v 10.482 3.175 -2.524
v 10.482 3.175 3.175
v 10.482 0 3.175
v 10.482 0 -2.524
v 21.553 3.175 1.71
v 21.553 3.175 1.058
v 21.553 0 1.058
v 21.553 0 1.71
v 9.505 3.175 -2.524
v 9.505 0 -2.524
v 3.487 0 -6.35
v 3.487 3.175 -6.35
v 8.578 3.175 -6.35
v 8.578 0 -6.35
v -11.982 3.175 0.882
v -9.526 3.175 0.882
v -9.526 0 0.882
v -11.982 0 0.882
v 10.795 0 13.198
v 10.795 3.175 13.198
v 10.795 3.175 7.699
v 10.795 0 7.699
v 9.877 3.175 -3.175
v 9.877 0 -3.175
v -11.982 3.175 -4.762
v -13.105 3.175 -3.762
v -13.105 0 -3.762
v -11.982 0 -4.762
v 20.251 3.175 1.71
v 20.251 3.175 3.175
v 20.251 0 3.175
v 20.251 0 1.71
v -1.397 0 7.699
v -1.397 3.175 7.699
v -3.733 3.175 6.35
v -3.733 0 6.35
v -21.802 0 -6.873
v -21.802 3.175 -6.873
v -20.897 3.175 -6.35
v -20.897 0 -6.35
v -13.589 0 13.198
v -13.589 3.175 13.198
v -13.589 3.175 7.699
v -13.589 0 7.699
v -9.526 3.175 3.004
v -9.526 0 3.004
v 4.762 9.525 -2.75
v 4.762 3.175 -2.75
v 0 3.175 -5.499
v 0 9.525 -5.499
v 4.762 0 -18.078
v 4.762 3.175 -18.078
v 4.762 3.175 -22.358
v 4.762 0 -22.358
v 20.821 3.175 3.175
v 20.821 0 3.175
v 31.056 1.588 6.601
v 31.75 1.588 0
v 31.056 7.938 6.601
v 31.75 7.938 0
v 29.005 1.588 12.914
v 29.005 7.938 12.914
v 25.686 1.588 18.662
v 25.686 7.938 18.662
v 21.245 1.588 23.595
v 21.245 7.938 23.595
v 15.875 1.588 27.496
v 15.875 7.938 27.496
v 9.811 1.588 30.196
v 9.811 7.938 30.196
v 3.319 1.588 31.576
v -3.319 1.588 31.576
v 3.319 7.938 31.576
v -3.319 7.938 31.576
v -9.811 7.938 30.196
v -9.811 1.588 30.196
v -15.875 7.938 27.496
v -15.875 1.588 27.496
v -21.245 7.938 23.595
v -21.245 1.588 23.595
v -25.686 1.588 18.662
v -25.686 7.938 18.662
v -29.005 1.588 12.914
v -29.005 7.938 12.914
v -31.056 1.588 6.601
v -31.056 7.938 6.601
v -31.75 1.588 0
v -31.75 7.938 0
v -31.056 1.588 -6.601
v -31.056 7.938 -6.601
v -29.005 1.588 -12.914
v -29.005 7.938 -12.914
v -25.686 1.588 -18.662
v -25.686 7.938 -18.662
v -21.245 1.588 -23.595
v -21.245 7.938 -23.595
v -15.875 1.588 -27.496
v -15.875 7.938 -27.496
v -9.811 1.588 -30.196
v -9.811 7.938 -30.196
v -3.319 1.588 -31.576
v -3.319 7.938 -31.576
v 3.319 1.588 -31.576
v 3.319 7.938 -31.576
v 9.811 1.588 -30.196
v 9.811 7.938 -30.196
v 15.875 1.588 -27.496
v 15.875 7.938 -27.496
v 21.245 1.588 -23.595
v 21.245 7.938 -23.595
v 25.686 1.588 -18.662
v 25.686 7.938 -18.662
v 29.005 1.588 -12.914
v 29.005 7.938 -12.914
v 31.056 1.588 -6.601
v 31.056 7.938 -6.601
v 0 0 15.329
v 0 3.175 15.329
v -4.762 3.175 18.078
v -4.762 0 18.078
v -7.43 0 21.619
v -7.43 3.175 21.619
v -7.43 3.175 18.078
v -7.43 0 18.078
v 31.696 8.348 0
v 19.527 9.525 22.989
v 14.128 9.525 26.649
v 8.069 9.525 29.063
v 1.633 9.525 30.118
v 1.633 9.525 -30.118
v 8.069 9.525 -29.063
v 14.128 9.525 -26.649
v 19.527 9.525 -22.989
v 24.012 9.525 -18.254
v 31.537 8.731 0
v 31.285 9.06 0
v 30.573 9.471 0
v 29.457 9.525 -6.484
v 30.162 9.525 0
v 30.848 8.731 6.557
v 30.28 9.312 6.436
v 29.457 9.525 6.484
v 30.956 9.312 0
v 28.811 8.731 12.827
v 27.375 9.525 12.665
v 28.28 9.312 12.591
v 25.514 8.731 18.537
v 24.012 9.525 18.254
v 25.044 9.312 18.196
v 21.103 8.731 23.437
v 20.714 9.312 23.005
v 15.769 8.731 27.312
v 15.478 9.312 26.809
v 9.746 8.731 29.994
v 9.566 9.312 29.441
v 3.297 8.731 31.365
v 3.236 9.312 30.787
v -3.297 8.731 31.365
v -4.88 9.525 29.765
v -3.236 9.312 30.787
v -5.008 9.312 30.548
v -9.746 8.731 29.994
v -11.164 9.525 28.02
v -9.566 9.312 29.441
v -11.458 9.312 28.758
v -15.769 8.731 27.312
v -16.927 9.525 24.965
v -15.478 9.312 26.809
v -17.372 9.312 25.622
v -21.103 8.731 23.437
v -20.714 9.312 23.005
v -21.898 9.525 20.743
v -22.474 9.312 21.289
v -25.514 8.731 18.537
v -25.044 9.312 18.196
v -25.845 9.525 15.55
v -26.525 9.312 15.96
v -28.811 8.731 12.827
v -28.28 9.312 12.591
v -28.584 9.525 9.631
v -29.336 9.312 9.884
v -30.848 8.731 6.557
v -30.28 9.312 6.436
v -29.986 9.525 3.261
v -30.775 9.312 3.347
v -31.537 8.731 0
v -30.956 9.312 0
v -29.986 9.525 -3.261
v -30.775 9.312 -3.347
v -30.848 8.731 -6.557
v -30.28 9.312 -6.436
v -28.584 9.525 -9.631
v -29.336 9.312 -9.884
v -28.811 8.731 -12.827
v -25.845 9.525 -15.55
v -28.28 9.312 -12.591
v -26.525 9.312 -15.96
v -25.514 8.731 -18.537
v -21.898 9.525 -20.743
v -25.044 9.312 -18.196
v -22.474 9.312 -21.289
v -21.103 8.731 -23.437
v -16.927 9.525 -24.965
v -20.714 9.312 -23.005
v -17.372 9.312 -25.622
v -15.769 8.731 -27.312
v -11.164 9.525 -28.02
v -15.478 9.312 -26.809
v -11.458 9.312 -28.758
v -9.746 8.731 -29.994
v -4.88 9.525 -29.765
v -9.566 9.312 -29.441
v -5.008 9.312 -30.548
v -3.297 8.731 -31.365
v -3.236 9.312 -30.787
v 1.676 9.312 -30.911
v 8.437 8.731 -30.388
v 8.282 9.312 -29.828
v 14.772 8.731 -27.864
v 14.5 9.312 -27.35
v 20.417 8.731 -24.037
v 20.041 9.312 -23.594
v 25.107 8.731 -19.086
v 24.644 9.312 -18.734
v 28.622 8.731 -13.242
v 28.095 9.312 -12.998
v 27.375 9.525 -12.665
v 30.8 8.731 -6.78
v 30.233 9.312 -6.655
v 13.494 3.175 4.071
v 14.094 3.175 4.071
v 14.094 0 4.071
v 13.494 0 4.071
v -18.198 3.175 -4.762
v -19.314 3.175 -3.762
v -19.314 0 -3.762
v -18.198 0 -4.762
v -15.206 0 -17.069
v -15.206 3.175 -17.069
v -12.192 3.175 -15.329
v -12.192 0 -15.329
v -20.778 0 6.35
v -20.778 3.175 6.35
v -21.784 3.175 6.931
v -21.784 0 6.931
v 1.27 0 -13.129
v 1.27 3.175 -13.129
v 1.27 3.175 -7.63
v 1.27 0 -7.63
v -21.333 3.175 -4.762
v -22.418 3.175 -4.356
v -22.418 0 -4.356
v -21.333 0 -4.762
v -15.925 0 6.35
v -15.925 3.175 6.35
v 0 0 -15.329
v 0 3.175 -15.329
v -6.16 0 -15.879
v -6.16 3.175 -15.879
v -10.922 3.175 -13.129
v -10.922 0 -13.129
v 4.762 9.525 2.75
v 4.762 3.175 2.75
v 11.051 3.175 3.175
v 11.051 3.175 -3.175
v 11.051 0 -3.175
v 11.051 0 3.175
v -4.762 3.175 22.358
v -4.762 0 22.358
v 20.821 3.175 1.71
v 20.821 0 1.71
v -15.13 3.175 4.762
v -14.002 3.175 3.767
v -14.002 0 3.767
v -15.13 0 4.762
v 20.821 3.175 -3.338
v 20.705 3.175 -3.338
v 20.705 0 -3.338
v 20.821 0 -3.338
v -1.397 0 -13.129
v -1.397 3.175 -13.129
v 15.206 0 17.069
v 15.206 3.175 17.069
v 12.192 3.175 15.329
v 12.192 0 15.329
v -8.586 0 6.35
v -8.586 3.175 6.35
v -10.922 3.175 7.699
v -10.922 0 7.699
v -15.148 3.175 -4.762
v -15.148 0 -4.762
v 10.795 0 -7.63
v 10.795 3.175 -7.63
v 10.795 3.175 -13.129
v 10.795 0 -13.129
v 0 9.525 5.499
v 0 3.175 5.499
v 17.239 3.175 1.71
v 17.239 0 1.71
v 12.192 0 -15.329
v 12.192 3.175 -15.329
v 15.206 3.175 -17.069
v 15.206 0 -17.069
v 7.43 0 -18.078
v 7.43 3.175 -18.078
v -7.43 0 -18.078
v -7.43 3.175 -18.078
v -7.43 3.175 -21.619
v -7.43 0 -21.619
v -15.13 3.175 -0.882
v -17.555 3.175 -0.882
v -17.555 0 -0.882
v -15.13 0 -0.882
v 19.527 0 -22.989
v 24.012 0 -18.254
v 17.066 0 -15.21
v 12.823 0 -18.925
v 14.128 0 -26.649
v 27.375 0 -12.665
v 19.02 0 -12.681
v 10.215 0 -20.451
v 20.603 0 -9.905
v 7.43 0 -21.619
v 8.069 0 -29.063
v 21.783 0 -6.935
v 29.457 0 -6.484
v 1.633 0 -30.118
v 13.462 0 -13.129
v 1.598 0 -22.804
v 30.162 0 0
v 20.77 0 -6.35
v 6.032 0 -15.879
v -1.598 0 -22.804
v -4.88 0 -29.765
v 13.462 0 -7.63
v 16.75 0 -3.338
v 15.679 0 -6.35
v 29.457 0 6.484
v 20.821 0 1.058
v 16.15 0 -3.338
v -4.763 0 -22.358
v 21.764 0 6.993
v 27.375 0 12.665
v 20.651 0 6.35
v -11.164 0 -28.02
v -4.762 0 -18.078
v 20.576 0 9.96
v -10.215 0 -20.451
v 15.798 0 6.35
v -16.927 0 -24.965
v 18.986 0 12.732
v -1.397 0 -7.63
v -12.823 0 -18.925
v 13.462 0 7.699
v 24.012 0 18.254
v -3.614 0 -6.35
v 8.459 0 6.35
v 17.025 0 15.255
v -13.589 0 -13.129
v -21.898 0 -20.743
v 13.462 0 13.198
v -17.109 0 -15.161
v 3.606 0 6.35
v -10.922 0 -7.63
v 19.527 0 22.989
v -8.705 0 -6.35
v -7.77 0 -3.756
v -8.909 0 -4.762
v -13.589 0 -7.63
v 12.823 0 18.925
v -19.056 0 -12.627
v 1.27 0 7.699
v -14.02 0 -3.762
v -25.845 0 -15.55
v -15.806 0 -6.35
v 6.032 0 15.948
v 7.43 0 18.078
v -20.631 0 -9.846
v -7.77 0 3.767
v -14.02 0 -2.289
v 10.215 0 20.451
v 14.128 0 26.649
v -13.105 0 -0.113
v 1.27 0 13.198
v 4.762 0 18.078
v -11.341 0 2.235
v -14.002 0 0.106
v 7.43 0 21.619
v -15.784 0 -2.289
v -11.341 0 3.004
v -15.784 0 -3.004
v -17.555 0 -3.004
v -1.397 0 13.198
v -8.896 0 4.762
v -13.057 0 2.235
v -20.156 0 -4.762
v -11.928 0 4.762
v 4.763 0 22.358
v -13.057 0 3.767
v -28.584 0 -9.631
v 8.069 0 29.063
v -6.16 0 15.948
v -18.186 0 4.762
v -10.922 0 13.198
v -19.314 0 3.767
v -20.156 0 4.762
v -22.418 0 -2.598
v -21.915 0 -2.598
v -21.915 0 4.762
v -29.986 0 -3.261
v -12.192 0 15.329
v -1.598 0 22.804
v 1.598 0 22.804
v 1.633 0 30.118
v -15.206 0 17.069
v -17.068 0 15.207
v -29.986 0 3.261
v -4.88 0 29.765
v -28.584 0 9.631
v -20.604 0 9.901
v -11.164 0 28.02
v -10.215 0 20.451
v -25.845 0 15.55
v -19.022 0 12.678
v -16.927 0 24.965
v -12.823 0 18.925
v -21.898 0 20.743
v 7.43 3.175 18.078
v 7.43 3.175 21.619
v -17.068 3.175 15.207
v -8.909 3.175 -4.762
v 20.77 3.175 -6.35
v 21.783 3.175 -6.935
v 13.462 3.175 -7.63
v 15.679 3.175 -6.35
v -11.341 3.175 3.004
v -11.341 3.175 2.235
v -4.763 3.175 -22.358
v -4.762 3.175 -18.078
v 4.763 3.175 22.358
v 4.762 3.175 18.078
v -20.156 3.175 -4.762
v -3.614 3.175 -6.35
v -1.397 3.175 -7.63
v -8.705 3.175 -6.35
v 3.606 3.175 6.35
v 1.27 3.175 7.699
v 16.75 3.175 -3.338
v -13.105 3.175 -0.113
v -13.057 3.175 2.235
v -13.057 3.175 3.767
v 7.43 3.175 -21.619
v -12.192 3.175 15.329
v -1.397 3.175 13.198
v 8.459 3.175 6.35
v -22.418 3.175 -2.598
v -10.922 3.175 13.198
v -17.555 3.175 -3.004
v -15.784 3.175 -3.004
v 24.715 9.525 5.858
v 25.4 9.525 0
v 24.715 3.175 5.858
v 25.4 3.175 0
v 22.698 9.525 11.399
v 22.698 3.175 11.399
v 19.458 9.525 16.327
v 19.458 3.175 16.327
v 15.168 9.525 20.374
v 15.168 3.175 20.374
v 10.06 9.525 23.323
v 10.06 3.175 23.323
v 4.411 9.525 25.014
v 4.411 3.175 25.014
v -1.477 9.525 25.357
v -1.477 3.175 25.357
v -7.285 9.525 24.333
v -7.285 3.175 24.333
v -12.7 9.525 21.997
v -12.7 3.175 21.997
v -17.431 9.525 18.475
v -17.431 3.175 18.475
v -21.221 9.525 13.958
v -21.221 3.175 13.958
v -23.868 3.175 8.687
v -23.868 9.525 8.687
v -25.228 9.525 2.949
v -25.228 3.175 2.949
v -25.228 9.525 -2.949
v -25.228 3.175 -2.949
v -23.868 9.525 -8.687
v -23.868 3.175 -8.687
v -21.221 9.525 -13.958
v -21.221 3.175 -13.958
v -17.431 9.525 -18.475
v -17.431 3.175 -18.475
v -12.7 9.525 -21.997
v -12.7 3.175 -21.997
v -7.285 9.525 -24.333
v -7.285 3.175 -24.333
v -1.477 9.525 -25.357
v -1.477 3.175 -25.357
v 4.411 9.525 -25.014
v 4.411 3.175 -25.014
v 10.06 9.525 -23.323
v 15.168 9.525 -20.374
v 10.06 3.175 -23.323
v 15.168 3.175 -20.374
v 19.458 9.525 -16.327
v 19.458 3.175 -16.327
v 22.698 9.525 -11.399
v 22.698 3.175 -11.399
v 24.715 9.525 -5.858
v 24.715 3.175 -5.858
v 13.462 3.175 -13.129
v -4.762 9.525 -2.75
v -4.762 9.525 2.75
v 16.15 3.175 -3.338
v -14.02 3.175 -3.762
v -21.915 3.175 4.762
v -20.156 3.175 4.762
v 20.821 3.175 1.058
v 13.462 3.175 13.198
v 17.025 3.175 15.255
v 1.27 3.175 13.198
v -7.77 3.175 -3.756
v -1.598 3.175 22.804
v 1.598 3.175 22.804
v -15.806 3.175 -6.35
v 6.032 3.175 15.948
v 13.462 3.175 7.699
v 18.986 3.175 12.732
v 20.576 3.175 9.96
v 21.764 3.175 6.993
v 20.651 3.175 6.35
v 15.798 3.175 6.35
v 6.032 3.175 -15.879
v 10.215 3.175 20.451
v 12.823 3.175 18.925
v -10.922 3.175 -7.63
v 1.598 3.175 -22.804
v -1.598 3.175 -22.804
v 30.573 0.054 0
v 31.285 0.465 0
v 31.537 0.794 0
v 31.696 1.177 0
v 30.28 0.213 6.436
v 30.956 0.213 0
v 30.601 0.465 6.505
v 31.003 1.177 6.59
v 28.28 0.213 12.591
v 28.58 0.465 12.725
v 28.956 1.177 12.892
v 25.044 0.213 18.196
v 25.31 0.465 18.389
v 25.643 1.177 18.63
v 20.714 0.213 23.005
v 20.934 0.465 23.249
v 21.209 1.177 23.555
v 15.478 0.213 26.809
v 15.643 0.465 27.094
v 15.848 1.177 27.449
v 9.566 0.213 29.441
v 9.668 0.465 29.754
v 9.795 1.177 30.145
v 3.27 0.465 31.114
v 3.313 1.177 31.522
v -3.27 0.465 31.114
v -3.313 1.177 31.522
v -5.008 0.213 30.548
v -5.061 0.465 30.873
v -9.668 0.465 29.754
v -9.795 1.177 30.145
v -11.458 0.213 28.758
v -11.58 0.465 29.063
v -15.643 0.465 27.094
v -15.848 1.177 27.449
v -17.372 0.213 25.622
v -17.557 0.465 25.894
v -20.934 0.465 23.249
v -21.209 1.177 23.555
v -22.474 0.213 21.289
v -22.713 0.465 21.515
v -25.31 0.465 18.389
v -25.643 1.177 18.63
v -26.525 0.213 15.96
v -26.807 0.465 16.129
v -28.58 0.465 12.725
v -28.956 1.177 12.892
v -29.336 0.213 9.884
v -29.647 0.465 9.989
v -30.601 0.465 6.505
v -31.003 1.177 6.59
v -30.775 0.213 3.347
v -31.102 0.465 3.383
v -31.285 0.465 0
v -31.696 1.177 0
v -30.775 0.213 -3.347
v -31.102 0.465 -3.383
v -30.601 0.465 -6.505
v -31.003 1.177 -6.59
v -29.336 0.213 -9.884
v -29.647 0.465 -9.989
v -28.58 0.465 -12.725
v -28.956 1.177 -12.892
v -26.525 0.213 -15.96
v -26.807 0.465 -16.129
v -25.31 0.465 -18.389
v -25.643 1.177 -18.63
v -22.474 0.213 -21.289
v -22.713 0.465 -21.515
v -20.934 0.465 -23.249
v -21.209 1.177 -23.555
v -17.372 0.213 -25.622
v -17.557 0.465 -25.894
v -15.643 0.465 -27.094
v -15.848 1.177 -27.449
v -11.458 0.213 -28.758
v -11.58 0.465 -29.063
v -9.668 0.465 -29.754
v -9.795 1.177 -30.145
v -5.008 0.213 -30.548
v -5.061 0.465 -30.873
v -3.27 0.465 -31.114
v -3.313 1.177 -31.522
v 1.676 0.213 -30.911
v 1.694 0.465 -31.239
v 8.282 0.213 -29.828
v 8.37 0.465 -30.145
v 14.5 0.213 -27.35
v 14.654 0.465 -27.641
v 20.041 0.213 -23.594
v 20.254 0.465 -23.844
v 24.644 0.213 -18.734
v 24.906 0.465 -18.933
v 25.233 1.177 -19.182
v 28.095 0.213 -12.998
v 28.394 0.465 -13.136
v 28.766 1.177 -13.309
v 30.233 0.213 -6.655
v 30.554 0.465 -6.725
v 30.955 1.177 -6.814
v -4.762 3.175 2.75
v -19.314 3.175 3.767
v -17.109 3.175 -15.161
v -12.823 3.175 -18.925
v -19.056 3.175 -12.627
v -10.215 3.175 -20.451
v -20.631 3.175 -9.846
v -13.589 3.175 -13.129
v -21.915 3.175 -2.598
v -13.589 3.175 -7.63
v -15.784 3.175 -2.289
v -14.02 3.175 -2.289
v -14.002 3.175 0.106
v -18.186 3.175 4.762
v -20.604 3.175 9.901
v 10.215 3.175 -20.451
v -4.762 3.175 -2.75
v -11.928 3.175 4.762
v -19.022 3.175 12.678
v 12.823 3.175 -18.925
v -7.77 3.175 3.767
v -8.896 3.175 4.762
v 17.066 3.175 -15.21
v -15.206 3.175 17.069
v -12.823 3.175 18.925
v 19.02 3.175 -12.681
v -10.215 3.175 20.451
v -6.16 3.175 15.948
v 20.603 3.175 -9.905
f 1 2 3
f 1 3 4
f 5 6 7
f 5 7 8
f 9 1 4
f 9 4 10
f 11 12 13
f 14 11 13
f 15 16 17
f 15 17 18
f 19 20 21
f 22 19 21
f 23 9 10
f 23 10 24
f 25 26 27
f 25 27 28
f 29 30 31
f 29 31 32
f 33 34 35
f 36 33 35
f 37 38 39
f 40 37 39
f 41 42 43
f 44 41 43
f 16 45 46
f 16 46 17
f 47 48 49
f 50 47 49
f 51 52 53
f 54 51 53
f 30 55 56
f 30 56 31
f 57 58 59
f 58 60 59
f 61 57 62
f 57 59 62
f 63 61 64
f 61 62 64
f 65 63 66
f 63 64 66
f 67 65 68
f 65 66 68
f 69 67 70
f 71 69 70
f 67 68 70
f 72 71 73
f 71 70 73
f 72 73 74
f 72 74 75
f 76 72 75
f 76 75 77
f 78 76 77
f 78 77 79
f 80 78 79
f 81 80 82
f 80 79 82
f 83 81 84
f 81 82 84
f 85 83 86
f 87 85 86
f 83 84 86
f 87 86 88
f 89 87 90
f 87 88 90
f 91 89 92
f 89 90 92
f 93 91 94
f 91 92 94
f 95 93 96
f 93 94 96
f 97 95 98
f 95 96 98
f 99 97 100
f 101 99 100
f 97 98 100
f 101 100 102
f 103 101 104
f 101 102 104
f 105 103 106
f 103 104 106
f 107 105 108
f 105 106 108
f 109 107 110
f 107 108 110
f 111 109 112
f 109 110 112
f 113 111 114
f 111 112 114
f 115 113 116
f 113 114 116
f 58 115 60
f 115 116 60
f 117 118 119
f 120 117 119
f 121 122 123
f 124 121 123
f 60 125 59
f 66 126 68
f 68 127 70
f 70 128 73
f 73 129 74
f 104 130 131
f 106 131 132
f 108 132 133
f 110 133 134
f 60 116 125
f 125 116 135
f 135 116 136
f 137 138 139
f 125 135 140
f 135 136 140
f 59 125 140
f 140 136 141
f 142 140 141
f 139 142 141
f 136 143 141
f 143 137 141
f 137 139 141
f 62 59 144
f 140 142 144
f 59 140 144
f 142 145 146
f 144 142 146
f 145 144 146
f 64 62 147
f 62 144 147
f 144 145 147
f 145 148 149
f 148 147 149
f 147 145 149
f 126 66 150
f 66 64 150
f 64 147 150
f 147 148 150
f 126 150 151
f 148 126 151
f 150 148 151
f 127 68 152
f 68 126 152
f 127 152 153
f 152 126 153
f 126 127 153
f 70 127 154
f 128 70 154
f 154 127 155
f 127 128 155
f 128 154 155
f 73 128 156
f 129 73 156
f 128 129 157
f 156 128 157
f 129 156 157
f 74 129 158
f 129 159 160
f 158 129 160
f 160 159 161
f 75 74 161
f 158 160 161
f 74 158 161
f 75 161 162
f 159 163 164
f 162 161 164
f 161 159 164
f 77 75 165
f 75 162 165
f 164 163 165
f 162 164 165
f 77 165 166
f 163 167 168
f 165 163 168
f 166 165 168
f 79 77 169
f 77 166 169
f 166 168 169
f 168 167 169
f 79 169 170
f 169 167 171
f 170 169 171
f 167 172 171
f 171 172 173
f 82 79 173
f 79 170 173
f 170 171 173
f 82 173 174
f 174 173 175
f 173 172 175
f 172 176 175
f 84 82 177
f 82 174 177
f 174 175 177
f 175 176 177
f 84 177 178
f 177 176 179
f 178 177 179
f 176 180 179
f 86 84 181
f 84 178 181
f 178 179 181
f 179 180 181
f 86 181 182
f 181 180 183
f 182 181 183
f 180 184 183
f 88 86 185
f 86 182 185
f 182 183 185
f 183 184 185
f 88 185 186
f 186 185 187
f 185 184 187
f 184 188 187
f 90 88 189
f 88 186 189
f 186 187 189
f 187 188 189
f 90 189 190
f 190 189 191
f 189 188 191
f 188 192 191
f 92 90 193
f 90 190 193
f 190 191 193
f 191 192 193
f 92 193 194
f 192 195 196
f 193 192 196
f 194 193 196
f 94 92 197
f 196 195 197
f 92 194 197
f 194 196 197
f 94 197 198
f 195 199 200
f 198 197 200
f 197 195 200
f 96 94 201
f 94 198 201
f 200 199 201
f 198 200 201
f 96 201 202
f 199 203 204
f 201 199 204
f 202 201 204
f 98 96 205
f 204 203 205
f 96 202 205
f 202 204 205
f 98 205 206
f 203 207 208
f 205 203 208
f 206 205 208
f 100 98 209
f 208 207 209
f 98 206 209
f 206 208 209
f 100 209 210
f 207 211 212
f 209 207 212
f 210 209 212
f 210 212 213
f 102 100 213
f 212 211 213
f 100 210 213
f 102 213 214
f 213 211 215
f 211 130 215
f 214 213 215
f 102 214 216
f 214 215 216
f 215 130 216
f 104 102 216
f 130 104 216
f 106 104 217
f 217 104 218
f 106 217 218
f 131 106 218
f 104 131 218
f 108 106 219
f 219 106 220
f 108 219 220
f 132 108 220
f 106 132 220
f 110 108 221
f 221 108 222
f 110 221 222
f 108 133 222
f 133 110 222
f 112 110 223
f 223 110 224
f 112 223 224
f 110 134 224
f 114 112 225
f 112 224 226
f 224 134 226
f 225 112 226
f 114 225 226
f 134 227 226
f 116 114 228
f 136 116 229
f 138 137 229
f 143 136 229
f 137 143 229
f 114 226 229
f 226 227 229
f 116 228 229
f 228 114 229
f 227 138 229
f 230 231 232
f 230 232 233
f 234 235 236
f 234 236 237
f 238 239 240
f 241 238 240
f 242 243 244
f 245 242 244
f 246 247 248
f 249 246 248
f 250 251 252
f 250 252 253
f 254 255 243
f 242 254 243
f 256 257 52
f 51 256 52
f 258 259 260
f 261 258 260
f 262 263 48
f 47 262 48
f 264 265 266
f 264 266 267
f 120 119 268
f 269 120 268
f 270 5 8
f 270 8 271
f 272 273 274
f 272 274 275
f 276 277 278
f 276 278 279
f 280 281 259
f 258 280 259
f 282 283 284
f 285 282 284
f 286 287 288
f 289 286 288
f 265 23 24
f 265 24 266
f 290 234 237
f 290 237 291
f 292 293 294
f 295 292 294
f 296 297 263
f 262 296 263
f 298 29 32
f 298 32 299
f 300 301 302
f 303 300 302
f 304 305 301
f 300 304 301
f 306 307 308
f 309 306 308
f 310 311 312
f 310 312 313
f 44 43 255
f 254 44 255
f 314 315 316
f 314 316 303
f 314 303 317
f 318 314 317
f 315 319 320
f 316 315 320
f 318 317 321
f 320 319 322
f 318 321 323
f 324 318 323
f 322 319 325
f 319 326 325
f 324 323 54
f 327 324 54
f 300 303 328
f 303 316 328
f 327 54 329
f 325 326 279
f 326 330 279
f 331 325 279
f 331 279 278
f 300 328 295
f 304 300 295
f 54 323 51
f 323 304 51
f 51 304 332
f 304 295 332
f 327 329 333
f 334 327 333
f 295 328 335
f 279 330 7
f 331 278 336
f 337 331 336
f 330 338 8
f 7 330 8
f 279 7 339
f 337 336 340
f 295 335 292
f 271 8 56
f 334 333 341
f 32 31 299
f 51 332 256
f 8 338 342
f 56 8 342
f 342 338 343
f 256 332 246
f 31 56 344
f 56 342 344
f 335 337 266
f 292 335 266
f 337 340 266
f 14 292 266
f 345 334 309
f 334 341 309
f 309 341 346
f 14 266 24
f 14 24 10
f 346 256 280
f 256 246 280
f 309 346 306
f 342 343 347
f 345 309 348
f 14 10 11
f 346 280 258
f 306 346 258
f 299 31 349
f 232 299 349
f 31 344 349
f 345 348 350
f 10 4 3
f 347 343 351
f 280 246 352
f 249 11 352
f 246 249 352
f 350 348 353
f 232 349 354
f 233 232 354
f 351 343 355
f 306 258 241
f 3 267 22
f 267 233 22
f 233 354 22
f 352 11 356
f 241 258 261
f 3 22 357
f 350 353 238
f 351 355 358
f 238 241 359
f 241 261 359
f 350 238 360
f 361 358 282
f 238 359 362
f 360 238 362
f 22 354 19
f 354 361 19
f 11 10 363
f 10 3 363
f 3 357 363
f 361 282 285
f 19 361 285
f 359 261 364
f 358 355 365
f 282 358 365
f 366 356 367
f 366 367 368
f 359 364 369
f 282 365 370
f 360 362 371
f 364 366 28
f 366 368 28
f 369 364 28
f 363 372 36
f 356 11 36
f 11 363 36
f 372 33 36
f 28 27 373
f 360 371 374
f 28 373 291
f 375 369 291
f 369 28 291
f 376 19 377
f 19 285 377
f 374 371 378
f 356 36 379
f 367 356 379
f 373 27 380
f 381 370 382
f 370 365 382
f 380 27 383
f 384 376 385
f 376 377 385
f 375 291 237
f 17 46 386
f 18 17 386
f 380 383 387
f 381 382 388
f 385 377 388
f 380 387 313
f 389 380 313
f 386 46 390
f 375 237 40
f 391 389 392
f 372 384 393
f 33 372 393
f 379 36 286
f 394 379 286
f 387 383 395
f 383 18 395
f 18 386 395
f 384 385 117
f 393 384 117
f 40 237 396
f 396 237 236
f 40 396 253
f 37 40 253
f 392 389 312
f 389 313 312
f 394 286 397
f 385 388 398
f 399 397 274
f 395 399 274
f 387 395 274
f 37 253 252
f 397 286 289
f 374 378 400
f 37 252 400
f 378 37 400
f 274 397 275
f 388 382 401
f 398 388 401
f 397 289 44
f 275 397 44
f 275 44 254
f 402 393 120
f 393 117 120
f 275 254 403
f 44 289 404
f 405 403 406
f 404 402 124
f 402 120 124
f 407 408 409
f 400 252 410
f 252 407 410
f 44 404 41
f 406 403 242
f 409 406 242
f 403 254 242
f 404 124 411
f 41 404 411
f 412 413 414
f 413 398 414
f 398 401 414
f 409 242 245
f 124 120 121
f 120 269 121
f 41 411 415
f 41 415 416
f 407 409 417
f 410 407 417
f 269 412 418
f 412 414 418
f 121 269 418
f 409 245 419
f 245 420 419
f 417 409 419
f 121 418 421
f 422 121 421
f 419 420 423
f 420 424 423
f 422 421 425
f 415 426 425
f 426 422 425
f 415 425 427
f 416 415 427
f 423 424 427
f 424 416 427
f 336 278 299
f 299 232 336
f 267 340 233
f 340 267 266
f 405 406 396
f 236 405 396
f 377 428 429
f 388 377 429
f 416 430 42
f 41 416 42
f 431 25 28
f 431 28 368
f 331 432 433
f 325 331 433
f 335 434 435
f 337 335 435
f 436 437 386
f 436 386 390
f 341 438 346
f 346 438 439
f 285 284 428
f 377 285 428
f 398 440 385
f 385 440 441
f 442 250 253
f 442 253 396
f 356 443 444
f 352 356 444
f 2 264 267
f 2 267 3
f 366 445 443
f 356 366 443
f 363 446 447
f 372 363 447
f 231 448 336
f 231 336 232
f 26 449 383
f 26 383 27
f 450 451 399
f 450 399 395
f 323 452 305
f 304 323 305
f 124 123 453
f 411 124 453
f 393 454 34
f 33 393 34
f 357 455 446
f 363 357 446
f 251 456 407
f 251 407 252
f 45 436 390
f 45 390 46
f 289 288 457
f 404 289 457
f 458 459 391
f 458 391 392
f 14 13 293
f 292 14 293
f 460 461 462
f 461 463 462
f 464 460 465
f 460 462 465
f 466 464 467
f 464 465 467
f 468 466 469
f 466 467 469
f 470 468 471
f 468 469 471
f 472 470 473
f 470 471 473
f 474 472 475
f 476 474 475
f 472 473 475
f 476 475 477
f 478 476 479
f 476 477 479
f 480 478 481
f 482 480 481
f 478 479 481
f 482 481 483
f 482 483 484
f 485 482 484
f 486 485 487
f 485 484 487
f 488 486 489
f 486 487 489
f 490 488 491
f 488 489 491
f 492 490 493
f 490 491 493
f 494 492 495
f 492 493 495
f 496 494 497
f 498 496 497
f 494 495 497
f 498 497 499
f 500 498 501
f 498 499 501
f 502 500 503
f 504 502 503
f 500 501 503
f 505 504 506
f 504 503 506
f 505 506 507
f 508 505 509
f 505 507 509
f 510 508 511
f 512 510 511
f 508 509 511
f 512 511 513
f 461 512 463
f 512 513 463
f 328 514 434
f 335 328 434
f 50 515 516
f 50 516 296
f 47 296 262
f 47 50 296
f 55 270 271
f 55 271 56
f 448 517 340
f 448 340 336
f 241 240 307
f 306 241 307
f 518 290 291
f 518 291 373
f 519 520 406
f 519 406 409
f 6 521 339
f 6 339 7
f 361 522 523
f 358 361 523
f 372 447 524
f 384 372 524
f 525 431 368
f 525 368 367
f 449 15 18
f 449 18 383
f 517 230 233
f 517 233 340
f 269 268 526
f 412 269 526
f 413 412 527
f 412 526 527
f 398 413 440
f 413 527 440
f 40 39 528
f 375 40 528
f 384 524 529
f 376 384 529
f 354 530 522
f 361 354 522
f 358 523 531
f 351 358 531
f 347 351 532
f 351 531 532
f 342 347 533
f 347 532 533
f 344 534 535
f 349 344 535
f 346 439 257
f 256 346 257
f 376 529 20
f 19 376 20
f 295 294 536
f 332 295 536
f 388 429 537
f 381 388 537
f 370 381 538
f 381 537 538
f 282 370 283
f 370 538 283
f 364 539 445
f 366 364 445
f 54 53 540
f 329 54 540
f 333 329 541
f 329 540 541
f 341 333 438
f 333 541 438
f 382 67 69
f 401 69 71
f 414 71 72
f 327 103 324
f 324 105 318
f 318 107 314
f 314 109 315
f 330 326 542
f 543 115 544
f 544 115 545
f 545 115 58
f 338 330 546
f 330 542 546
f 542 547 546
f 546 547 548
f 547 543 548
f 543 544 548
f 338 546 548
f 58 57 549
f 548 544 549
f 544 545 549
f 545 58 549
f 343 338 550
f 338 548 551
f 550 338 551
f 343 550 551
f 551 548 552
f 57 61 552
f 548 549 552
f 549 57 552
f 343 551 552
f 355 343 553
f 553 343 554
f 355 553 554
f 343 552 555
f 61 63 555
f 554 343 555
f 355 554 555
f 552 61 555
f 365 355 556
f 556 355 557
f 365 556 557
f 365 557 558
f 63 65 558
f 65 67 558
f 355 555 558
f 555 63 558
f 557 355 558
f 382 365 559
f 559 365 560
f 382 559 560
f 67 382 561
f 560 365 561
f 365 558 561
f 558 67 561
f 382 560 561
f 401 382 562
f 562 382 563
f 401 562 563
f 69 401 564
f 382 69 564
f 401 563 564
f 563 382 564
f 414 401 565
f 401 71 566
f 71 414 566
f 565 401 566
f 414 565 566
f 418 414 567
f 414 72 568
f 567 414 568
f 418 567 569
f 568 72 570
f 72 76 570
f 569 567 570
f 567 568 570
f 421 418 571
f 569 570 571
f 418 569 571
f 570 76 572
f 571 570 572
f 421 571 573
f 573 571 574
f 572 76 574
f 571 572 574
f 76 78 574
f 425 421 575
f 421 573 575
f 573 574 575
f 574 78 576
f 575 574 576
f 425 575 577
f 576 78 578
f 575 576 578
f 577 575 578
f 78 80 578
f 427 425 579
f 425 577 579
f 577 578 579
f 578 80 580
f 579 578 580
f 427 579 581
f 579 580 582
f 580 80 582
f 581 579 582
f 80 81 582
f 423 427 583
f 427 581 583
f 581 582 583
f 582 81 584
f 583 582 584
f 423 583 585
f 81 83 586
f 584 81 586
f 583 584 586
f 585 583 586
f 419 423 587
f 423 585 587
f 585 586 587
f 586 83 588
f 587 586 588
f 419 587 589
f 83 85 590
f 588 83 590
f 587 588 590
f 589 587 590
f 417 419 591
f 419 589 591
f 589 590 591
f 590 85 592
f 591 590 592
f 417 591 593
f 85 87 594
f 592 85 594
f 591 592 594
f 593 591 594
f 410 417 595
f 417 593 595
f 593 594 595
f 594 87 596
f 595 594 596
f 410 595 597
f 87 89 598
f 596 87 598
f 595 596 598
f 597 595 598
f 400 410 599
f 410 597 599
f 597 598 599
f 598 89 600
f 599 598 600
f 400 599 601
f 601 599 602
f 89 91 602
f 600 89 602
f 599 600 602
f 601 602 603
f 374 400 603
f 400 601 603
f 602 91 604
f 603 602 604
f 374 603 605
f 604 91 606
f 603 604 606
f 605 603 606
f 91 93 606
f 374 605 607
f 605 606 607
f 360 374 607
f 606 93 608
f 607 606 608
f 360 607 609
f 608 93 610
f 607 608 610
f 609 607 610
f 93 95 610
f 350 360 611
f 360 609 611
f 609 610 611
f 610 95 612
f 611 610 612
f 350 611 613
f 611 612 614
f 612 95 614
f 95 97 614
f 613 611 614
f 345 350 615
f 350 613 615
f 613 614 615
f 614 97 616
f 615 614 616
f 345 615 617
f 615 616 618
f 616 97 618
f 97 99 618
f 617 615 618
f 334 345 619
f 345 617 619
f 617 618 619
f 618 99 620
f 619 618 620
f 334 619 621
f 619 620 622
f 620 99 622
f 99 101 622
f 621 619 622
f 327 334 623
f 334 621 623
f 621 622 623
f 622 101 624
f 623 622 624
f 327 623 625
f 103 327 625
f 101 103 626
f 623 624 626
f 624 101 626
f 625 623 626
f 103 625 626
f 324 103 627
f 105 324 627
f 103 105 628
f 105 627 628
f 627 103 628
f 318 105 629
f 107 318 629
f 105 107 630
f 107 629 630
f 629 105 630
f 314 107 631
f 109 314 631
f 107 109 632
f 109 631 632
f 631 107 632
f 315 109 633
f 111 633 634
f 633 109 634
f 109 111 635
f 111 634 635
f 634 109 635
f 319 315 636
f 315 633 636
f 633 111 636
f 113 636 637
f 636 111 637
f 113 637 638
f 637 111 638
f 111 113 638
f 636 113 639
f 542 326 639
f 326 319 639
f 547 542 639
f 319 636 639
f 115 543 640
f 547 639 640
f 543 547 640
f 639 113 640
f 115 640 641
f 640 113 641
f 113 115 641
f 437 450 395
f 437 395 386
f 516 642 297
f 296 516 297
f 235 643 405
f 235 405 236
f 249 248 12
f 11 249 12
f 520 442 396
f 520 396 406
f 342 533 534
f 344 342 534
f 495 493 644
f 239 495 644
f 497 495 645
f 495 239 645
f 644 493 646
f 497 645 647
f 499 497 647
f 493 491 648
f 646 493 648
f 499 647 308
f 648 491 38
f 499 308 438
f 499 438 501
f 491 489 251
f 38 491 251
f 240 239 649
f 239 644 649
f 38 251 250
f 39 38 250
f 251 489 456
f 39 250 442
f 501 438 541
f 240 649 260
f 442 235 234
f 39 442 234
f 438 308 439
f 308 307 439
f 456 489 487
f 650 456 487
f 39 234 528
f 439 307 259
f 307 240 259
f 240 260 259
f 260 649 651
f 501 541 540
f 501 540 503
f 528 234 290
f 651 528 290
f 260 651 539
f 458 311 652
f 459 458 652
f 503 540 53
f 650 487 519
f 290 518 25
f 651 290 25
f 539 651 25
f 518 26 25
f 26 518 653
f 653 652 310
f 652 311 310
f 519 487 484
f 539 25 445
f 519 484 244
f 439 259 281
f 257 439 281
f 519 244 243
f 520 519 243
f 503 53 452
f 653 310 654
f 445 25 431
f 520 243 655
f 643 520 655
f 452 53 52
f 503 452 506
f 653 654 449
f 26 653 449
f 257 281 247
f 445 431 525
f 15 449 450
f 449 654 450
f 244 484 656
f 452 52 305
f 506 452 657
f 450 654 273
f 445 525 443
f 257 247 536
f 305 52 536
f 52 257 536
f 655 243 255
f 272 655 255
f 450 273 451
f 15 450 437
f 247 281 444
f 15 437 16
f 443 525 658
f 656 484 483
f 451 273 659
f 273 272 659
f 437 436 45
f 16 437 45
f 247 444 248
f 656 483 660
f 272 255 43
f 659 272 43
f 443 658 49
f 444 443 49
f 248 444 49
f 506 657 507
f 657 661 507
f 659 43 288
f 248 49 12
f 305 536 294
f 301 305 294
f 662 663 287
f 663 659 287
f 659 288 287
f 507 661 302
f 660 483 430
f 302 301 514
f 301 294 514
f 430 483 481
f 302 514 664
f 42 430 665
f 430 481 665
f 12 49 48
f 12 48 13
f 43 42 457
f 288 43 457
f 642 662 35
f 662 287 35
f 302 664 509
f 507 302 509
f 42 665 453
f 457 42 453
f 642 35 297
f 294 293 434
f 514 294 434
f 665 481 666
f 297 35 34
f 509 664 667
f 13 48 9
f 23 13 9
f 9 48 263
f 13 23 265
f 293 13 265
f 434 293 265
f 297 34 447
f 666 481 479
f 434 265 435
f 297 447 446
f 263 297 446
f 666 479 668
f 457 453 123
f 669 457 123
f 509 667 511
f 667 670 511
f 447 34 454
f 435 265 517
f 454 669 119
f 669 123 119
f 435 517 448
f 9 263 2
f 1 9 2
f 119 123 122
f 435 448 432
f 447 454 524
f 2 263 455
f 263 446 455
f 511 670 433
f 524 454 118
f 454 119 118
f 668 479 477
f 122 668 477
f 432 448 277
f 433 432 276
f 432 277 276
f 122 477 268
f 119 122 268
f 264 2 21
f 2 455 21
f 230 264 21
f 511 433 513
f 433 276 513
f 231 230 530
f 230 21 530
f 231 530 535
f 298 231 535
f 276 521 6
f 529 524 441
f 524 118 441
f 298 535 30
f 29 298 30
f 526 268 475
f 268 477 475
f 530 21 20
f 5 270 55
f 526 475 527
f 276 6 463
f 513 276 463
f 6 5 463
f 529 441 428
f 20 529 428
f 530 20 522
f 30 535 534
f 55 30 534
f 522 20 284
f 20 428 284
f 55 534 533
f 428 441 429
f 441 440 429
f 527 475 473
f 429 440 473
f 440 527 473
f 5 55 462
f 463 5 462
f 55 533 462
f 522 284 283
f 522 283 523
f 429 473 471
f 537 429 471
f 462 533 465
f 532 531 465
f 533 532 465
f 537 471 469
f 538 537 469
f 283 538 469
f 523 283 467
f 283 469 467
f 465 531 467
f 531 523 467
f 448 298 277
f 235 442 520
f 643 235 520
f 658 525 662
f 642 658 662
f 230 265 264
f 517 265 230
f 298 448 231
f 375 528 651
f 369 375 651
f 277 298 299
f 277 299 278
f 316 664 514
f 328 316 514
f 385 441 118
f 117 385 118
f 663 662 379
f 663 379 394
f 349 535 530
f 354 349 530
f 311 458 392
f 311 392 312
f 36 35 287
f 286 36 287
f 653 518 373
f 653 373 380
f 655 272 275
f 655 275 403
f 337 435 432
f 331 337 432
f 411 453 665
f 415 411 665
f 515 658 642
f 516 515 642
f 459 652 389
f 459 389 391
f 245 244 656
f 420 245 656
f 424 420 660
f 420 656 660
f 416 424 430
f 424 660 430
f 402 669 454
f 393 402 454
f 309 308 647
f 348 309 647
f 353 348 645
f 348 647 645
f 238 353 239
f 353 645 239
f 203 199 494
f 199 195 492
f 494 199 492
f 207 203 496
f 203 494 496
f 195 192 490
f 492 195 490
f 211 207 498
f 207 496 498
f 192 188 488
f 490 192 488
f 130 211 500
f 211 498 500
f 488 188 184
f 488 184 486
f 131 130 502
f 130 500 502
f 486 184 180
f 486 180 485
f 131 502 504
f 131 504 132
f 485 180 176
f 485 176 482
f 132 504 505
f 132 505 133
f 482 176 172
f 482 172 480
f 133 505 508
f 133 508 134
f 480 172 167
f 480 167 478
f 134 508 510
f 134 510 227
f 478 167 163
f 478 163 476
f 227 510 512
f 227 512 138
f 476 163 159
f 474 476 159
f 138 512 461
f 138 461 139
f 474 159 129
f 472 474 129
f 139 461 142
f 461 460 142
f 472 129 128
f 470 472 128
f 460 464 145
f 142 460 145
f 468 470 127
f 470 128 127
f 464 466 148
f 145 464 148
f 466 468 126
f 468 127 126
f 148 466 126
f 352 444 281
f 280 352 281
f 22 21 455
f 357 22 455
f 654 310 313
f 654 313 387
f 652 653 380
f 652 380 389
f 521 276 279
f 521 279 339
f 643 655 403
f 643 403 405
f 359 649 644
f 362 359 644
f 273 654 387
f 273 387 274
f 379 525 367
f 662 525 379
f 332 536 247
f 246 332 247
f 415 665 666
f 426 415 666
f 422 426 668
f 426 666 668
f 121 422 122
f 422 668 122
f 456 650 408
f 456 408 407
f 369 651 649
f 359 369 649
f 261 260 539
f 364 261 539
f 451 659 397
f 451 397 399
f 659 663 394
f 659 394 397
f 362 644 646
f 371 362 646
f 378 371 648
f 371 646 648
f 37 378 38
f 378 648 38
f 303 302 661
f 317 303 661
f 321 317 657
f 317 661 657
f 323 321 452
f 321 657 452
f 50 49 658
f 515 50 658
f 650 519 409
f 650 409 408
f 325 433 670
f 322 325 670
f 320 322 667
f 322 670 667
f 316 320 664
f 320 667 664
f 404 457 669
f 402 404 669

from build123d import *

# Parameters (mm, degrees)
BOSS_EXTRUDE1_DEPTH     = 6.35
CUT_EXTRUDE1_DEPTH      = 7.3500001
CUT_EXTRUDE1_DEPTH_BACK = 4.175
CUT_EXTRUDE3_DEPTH      = 7.3500001
CUT_EXTRUDE3_DEPTH_BACK = 4.175


with BuildPart() as part:
    # Sketch1 → Revolve1 (revolve)
    with BuildSketch(Plane.XY):
        with BuildLine():
            Line((0, 0), (30.1625, 0))
            ThreePointArc((30.1625, 0), (31.285032015, 0.464967985), (31.75, 1.5875))
            Line((31.75, 1.5875), (31.75, 7.9375))
            ThreePointArc((31.75, 7.9375), (31.285032015, 9.060032015), (30.1625, 9.525))
            Line((30.1625, 9.525), (25.4, 9.525))
            Line((25.4, 9.525), (25.4, 3.175))
            Line((25.4, 3.175), (0, 3.175))
            Line((0, 3.175), (0, 0))
        make_face()
    revolve(axis=Axis((0, 3.175, 0), (0, -1, 0)))

    # Sketch2 → Boss-Extrude1 (add)
    with BuildSketch(Plane(origin=(0, 3.175, 0), x_dir=(1, 0, 0), z_dir=(0, 1, 0))):
        Polygon((0, -5.499261314), (4.7625, -2.749630657), (4.7625, 2.749630657), (0, 5.499261314), (-4.7625, 2.749630657), (-4.7625, -2.749630657), align=None)
    extrude(amount=BOSS_EXTRUDE1_DEPTH)

    # Sketch3 → Cut-Extrude1 (cut, two sides)
    with BuildSketch(Plane(origin=(0, 3.175, 0), x_dir=(1, 0, 0), z_dir=(0, 1, 0))) as cut_extrude1_sk:
        Polygon((-20.156339589, -4.7625), (-21.915105149, -4.7625), (-21.915105149, 2.597727273), (-22.418122878, 2.597727273), (-22.418122878, 4.356492833), (-21.333041777, 4.7625), (-20.156339589, 4.7625), align=None)
        Polygon((-14.001558374, -3.767243493), (-15.129755281, -4.7625), (-18.185587986, -4.7625), (-19.313784892, -3.767243493), (-19.313784892, 3.761854017), (-18.198163429, 4.7625), (-15.1477202, 4.7625), (-14.019523293, 3.761854017), (-14.019523293, 2.288730668), (-15.783678329, 2.288730668), (-15.783678329, 3.00373444), (-17.555019332, 3.00373444), (-17.555019332, 0.882077518), (-15.129755281, 0.882077518), (-14.001558374, -0.105993022), align=None)
        Polygon((-7.769528008, -3.767243493), (-8.895928423, -4.7625), (-11.928406733, -4.7625), (-13.05660364, -3.767243493), (-13.05660364, -2.234835911), (-11.340953885, -2.234835911), (-11.340953885, -3.00373444), (-9.526497077, -3.00373444), (-9.526497077, -0.882077518), (-11.98230149, -0.882077518), (-13.105108921, 0.113178989), (-13.105108921, 3.761854017), (-11.98230149, 4.7625), (-8.908503866, 4.7625), (-7.769528008, 3.756464542), align=None)
        Polygon((9.877353766, 3.175), (11.051442308, 3.175), (11.051442308, -3.175), (10.481570513, -3.175), (10.481570513, 2.523717949), (9.504647436, 2.523717949), align=None)
        Polygon((16.750160256, 3.337820513), (14.094150641, -4.070512821), (13.49375, -4.070512821), (16.149759615, 3.337820513), align=None)
        Polygon((20.704917869, 3.337820513), (20.820673077, 3.337820513), (20.820673077, -1.058333333), (21.553365385, -1.058333333), (21.553365385, -1.709615385), (20.820673077, -1.709615385), (20.820673077, -3.175), (20.250801282, -3.175), (20.250801282, -1.709615385), (17.238621795, -1.709615385), align=None)
    extrude(amount=CUT_EXTRUDE1_DEPTH, mode=Mode.SUBTRACT)
    extrude(cut_extrude1_sk.sketch, amount=-CUT_EXTRUDE1_DEPTH_BACK, mode=Mode.SUBTRACT)

    # Sketch4 → Cut-Extrude3 (cut, two sides)
    with BuildSketch(Plane(origin=(0, 3.175, 0), x_dir=(1, 0, 0), z_dir=(0, 1, 0))) as cut_extrude3_sk:
        with BuildLine():
            Line((-20.897368408, 6.35), (-15.805631592, 6.35))
            Line((-15.805631592, 6.35), (-13.589, 7.629772846))
            Line((-13.589, 7.629772846), (-13.589, 13.12903416))
            Line((-13.589, 13.12903416), (-17.108932059, 15.161267882))
            ThreePointArc((-17.108932059, 15.161267882), (-19.892207199, 11.264088635), (-21.802466353, 6.872558542))
            Line((-21.802466353, 6.872558542), (-20.897368408, 6.35))
        make_face()
        with BuildLine():
            ThreePointArc((-7.4295, 21.619022405), (-11.544244404, 19.730940706), (-15.206214659, 17.068996331))
            Line((-15.206214659, 17.068996331), (-12.192, 15.328738686))
            Line((-12.192, 15.328738686), (-7.4295, 18.078369343))
            Line((-7.4295, 18.078369343), (-7.4295, 21.619022405))
        make_face()
        Polygon((-8.705368408, 6.35), (-3.613631592, 6.35), (-1.397, 7.629772846), (-1.397, 13.12903416), (-6.1595, 15.878664817), (-10.922, 13.12903416), (-10.922, 7.629772846), align=None)
        with BuildLine():
            ThreePointArc((4.7625, 22.358403202), (0, 22.86), (-4.7625, 22.358403202))
            Line((-4.7625, 22.358403202), (-4.7625, 18.078369343))
            Line((-4.7625, 18.078369343), (0, 15.328738686))
            Line((0, 15.328738686), (4.7625, 18.078369343))
            Line((4.7625, 18.078369343), (4.7625, 22.358403202))
        make_face()
        Polygon((1.27, 7.629772846), (3.486631592, 6.35), (8.578368408, 6.35), (10.795, 7.629772846), (10.795, 13.12903416), (6.0325, 15.878664817), (1.27, 13.12903416), align=None)
        with BuildLine():
            Line((12.192, 15.328738686), (15.206214659, 17.068996331))
            ThreePointArc((15.206214659, 17.068996331), (11.544244404, 19.730940706), (7.4295, 21.619022405))
            Line((7.4295, 21.619022405), (7.4295, 18.078369343))
            Line((7.4295, 18.078369343), (12.192, 15.328738686))
        make_face()
        with BuildLine():
            Line((13.462, 7.629772846), (15.678631592, 6.35))
            Line((15.678631592, 6.35), (20.770368408, 6.35))
            Line((20.770368408, 6.35), (21.782830062, 6.934545009))
            ThreePointArc((21.782830062, 6.934545009), (19.860135036, 11.320540463), (17.065866333, 15.209727358))
            Line((17.065866333, 15.209727358), (13.462, 13.12903416))
            Line((13.462, 13.12903416), (13.462, 7.629772846))
        make_face()
        with BuildLine():
            Line((20.650522628, -6.35), (15.798477372, -6.35))
            Line((15.798477372, -6.35), (13.462, -7.69896584))
            Line((13.462, -7.69896584), (13.462, -13.198227154))
            Line((13.462, -13.198227154), (17.025077395, -15.255370847))
            ThreePointArc((17.025077395, -15.255370847), (19.829723184, -11.373727554), (21.764149656, -6.992952864))
            Line((21.764149656, -6.992952864), (20.650522628, -6.35))
        make_face()
        with BuildLine():
            ThreePointArc((7.4295, -21.619022405), (11.544244404, -19.730940706), (15.206214659, -17.068996331))
            Line((15.206214659, -17.068996331), (12.192, -15.328738686))
            Line((12.192, -15.328738686), (7.4295, -18.078369343))
            Line((7.4295, -18.078369343), (7.4295, -21.619022405))
        make_face()
        Polygon((8.458522628, -6.35), (3.606477372, -6.35), (1.27, -7.69896584), (1.27, -13.198227154), (6.0325, -15.947857811), (10.795, -13.198227154), (10.795, -7.69896584), align=None)
        with BuildLine():
            Line((-4.7625, -18.078369343), (-4.7625, -22.358403202))
            ThreePointArc((-4.7625, -22.358403202), (0, -22.86), (4.7625, -22.358403202))
            Line((4.7625, -22.358403202), (4.7625, -18.078369343))
            Line((4.7625, -18.078369343), (0, -15.328738686))
            Line((0, -15.328738686), (-4.7625, -18.078369343))
        make_face()
        Polygon((-1.397, -7.69896584), (-3.733477372, -6.35), (-8.585522628, -6.35), (-10.922, -7.69896584), (-10.922, -13.198227154), (-6.1595, -15.947857811), (-1.397, -13.198227154), align=None)
        with BuildLine():
            Line((-12.192, -15.328738686), (-15.206214659, -17.068996331))
            ThreePointArc((-15.206214659, -17.068996331), (-11.544244404, -19.730940706), (-7.4295, -21.619022405))
            Line((-7.4295, -21.619022405), (-7.4295, -18.078369343))
            Line((-7.4295, -18.078369343), (-12.192, -15.328738686))
        make_face()
        with BuildLine():
            Line((-13.589, -7.69896584), (-15.925477372, -6.35))
            Line((-15.925477372, -6.35), (-20.777522628, -6.35))
            Line((-20.777522628, -6.35), (-21.783940581, -6.931055676))
            ThreePointArc((-21.783940581, -6.931055676), (-19.861945981, -11.317362848), (-17.068296652, -15.207000013))
            Line((-17.068296652, -15.207000013), (-13.589, -13.198227154))
            Line((-13.589, -13.198227154), (-13.589, -7.69896584))
        make_face()
    extrude(amount=CUT_EXTRUDE3_DEPTH, mode=Mode.SUBTRACT)
    extrude(cut_extrude3_sk.sketch, amount=-CUT_EXTRUDE3_DEPTH_BACK, mode=Mode.SUBTRACT)


solid = part.part
